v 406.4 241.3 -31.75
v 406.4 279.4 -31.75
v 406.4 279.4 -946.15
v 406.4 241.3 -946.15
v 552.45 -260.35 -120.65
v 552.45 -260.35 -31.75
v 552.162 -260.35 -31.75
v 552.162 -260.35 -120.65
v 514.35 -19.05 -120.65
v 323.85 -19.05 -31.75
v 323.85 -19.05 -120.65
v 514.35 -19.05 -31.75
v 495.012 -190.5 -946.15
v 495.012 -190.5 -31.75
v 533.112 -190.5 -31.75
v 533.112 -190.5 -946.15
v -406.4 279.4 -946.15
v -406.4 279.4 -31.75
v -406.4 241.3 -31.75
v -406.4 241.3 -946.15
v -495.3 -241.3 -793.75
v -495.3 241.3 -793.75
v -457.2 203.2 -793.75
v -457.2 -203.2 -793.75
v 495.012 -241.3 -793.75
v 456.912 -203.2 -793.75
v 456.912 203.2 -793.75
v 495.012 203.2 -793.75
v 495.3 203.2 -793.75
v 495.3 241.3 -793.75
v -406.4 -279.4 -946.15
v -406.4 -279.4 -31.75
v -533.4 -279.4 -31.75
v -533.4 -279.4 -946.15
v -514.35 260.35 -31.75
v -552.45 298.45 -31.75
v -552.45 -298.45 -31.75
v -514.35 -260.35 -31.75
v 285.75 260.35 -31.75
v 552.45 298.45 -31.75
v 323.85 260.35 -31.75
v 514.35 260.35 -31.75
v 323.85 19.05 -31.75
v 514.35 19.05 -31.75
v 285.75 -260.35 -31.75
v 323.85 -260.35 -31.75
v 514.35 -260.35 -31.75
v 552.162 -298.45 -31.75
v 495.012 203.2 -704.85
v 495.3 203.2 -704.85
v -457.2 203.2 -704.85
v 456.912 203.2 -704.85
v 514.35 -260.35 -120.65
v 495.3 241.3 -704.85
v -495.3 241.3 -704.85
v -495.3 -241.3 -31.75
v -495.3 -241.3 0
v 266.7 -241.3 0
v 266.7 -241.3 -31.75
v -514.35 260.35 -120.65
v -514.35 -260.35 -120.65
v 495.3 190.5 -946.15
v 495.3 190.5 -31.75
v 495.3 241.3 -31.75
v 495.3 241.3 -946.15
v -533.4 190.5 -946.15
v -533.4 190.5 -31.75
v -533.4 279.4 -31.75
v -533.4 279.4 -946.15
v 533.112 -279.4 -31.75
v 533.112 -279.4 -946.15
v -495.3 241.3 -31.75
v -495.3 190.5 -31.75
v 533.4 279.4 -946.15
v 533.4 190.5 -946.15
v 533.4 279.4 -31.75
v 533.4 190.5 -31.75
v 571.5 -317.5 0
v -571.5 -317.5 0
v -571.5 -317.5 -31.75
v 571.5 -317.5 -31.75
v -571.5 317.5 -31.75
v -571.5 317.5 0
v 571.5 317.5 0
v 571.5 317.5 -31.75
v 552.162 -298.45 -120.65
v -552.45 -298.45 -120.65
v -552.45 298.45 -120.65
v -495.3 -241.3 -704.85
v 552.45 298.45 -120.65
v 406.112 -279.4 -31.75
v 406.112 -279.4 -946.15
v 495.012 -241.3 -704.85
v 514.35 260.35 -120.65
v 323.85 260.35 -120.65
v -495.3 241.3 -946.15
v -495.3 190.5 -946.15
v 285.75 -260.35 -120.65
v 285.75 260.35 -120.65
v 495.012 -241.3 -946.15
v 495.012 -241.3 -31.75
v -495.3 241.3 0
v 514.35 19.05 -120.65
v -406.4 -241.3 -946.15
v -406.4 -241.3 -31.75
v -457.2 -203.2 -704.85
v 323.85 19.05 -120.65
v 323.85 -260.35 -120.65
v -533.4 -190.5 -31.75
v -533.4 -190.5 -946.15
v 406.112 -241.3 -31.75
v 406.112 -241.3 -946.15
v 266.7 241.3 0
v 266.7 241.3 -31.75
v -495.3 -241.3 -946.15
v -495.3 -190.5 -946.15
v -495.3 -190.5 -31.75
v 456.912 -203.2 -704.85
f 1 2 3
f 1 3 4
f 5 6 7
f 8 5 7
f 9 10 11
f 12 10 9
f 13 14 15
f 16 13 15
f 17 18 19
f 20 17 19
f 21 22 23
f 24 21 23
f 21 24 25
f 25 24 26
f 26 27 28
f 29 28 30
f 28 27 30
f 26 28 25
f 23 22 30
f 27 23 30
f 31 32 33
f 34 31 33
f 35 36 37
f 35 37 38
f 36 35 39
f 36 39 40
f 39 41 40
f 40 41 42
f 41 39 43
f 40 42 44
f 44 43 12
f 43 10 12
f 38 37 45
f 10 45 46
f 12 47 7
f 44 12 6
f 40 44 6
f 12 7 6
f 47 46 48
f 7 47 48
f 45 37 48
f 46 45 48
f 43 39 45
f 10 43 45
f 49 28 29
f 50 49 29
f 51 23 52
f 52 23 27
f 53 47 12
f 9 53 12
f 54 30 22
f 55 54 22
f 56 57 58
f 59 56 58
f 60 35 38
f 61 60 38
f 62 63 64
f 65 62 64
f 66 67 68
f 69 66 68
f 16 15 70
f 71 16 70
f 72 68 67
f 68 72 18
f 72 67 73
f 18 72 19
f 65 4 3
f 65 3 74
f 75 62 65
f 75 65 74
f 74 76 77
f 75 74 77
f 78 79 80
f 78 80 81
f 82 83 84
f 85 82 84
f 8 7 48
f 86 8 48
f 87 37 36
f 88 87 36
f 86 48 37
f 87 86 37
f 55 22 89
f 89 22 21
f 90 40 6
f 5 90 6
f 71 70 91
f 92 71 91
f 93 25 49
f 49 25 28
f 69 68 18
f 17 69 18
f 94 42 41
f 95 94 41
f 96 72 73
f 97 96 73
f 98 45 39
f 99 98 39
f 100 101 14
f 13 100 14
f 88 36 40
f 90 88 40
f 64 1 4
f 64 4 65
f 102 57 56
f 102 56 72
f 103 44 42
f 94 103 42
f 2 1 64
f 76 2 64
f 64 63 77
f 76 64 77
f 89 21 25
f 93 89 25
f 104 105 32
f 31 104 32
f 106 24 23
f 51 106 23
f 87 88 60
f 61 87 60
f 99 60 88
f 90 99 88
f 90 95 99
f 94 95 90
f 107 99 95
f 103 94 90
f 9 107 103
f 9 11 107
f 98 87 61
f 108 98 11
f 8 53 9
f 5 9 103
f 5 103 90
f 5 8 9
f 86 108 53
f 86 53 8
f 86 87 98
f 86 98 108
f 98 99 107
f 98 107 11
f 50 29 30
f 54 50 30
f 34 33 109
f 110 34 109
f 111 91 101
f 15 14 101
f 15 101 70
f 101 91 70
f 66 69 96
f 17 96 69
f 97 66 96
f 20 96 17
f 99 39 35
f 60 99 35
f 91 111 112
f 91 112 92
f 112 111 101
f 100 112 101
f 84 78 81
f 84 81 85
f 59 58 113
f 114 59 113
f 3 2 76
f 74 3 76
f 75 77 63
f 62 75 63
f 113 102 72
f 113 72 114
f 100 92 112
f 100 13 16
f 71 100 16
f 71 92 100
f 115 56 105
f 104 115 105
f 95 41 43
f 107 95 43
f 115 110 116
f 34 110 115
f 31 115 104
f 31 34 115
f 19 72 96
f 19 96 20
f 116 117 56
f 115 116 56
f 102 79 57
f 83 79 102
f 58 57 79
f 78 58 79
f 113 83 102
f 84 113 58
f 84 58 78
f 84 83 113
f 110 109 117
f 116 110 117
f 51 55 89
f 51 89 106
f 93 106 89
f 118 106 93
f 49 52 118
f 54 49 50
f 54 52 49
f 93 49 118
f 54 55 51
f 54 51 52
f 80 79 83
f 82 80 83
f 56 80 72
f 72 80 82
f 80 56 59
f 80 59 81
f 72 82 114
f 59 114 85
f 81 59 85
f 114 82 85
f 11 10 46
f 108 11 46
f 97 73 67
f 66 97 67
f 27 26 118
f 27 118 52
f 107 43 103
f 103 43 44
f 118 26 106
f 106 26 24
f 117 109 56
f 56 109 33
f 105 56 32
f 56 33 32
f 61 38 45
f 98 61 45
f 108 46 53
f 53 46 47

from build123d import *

# Parameters (mm, degrees)
F2_W      = 1143
F2_H      = 635
F3_DEPTH  = 31.75
F1_W      = 762
F1_H      = 482.6
F4_DEPTH  = 31.751
F5_W      = 1.2670725822
F5_H      = 38.1
F5_W_2    = 190.5
F6_DEPTH  = 88.9
F7_W      = 88.9
F7_H      = 38.1
F8_DEPTH  = 914.4
F11_W     = 38.1
F11_H     = 406.4
F12_DEPTH = 88.9


with BuildPart() as f3:
    # F2 (on face) → F3 (new body)
    with BuildSketch(Plane.XY):
        Rectangle(F2_W, F2_H)
    extrude(amount=-F3_DEPTH)

    # F1 (on face) → F4 (cut, through all)
    with BuildSketch(Plane.XY):
        with Locations((-114.3, 0)):
            Rectangle(F1_W, F1_H)
    extrude(amount=-F4_DEPTH, mode=Mode.SUBTRACT)


with BuildPart() as f6:
    # F5 (on face) → F6 (new body)
    with BuildSketch(Plane(origin=(0, 0, -31.75), x_dir=(1, 0, 0), z_dir=(0, 0, -1))):
        Polygon((-552.45, 298.45), (-552.45, 260.35), (-514.35, 260.35), (285.75, 260.35), (323.85, 260.35), (372.0845580101, 260.35), (514.35, 260.35), (552.1619319916, 260.35), (552.1619319916, 298.45), align=None)
        Polygon((-514.35, 260.35), (-552.45, 260.35), (-552.45, -298.45), (-514.35, -298.45), (-514.35, -260.35), align=None)
        Polygon((285.75, -260.35), (-514.35, -260.35), (-514.35, -298.45), (514.35, -298.45), (514.35, -260.35), (323.85, -260.35), align=None)
        with Locations((514.9835362911, -279.4)):
            Rectangle(F5_W, F5_H)
        Polygon((552.45, 260.35), (552.1619319916, 260.35), (514.35, 260.35), (514.35, 19.05), (514.35, -19.05), (514.35, -260.35), (515.6170725822, -260.35), (515.6170725822, -298.45), (552.45, -298.45), align=None)
        Polygon((323.85, 260.35), (285.75, 260.35), (285.75, -260.35), (323.85, -260.35), (323.85, -19.05), (323.85, 19.05), align=None)
        with Locations((419.1, 0)):
            Rectangle(F5_W_2, F5_H)
    extrude(amount=F6_DEPTH)


with BuildPart() as f8:
    # F7 (on face) → F8 (new body)
    with BuildSketch(Plane(origin=(0, 0, -31.75), x_dir=(1, 0, 0), z_dir=(0, 0, -1))):
        Polygon((-495.3, 279.4), (-533.4, 279.4), (-533.4, 190.5), (-495.3, 190.5), (-495.3, 241.3), align=None)
        with Locations((-450.85, 260.35)):
            Rectangle(F7_W, F7_H)
    extrude(amount=F8_DEPTH)


with BuildPart() as f8b:
    # F7 (on face) → F8, piece 2 (new body)
    with BuildSketch(Plane(origin=(0, 0, -31.75), x_dir=(1, 0, 0), z_dir=(0, 0, -1))):
        Polygon((533.1119319916, 279.4), (495.0119319916, 279.4), (495.0119319916, 241.3), (495.0119319916, 190.5), (533.1119319916, 190.5), align=None)
        with Locations((450.5619319916, 260.35)):
            Rectangle(F7_W, F7_H)
    extrude(amount=F8_DEPTH)


with BuildPart() as f8c:
    # F7 (on face) → F8, piece 3 (new body)
    with BuildSketch(Plane(origin=(0, 0, -31.75), x_dir=(1, 0, 0), z_dir=(0, 0, -1))):
        Polygon((495.3, -279.4), (533.4, -279.4), (533.4, -190.5), (495.3, -190.5), (495.3, -241.3), align=None)
        with Locations((450.85, -260.35)):
            Rectangle(F7_W, F7_H)
    extrude(amount=F8_DEPTH)


with BuildPart() as f8d:
    # F7 (on face) → F8, piece 4 (new body)
    with BuildSketch(Plane(origin=(0, 0, -31.75), x_dir=(1, 0, 0), z_dir=(0, 0, -1))):
        Polygon((-533.4, -190.5), (-533.4, -279.4), (-495.3, -279.4), (-495.3, -241.3), (-495.3, -190.5), align=None)
        with Locations((-450.85, -260.35)):
            Rectangle(F7_W, F7_H)
    extrude(amount=F8_DEPTH)


with BuildPart() as f12:
    # F11 (on offset) → F12 (new body)
    with BuildSketch(Plane.XY.offset(-793.75)):
        Polygon((-495.3, -203.2), (-495.3, -241.3), (495.0119319916, -241.3), (495.0119319916, -203.2), (456.9119319916, -203.2), (-457.2, -203.2), align=None)
        with Locations((-476.25, 0)):
            Rectangle(F11_W, F11_H)
        with Locations((475.9619319916, 0)):
            Rectangle(F11_W, F11_H)
        Polygon((-495.3, 241.3), (-495.3, 203.2), (-457.2, 203.2), (456.9119319916, 203.2), (495.0119319916, 203.2), (495.3, 203.2), (495.3, 241.3), align=None)
    extrude(amount=F12_DEPTH)


solid = Compound([f3.part, f6.part, f8.part, f8b.part, f8c.part, f8d.part, f12.part])
